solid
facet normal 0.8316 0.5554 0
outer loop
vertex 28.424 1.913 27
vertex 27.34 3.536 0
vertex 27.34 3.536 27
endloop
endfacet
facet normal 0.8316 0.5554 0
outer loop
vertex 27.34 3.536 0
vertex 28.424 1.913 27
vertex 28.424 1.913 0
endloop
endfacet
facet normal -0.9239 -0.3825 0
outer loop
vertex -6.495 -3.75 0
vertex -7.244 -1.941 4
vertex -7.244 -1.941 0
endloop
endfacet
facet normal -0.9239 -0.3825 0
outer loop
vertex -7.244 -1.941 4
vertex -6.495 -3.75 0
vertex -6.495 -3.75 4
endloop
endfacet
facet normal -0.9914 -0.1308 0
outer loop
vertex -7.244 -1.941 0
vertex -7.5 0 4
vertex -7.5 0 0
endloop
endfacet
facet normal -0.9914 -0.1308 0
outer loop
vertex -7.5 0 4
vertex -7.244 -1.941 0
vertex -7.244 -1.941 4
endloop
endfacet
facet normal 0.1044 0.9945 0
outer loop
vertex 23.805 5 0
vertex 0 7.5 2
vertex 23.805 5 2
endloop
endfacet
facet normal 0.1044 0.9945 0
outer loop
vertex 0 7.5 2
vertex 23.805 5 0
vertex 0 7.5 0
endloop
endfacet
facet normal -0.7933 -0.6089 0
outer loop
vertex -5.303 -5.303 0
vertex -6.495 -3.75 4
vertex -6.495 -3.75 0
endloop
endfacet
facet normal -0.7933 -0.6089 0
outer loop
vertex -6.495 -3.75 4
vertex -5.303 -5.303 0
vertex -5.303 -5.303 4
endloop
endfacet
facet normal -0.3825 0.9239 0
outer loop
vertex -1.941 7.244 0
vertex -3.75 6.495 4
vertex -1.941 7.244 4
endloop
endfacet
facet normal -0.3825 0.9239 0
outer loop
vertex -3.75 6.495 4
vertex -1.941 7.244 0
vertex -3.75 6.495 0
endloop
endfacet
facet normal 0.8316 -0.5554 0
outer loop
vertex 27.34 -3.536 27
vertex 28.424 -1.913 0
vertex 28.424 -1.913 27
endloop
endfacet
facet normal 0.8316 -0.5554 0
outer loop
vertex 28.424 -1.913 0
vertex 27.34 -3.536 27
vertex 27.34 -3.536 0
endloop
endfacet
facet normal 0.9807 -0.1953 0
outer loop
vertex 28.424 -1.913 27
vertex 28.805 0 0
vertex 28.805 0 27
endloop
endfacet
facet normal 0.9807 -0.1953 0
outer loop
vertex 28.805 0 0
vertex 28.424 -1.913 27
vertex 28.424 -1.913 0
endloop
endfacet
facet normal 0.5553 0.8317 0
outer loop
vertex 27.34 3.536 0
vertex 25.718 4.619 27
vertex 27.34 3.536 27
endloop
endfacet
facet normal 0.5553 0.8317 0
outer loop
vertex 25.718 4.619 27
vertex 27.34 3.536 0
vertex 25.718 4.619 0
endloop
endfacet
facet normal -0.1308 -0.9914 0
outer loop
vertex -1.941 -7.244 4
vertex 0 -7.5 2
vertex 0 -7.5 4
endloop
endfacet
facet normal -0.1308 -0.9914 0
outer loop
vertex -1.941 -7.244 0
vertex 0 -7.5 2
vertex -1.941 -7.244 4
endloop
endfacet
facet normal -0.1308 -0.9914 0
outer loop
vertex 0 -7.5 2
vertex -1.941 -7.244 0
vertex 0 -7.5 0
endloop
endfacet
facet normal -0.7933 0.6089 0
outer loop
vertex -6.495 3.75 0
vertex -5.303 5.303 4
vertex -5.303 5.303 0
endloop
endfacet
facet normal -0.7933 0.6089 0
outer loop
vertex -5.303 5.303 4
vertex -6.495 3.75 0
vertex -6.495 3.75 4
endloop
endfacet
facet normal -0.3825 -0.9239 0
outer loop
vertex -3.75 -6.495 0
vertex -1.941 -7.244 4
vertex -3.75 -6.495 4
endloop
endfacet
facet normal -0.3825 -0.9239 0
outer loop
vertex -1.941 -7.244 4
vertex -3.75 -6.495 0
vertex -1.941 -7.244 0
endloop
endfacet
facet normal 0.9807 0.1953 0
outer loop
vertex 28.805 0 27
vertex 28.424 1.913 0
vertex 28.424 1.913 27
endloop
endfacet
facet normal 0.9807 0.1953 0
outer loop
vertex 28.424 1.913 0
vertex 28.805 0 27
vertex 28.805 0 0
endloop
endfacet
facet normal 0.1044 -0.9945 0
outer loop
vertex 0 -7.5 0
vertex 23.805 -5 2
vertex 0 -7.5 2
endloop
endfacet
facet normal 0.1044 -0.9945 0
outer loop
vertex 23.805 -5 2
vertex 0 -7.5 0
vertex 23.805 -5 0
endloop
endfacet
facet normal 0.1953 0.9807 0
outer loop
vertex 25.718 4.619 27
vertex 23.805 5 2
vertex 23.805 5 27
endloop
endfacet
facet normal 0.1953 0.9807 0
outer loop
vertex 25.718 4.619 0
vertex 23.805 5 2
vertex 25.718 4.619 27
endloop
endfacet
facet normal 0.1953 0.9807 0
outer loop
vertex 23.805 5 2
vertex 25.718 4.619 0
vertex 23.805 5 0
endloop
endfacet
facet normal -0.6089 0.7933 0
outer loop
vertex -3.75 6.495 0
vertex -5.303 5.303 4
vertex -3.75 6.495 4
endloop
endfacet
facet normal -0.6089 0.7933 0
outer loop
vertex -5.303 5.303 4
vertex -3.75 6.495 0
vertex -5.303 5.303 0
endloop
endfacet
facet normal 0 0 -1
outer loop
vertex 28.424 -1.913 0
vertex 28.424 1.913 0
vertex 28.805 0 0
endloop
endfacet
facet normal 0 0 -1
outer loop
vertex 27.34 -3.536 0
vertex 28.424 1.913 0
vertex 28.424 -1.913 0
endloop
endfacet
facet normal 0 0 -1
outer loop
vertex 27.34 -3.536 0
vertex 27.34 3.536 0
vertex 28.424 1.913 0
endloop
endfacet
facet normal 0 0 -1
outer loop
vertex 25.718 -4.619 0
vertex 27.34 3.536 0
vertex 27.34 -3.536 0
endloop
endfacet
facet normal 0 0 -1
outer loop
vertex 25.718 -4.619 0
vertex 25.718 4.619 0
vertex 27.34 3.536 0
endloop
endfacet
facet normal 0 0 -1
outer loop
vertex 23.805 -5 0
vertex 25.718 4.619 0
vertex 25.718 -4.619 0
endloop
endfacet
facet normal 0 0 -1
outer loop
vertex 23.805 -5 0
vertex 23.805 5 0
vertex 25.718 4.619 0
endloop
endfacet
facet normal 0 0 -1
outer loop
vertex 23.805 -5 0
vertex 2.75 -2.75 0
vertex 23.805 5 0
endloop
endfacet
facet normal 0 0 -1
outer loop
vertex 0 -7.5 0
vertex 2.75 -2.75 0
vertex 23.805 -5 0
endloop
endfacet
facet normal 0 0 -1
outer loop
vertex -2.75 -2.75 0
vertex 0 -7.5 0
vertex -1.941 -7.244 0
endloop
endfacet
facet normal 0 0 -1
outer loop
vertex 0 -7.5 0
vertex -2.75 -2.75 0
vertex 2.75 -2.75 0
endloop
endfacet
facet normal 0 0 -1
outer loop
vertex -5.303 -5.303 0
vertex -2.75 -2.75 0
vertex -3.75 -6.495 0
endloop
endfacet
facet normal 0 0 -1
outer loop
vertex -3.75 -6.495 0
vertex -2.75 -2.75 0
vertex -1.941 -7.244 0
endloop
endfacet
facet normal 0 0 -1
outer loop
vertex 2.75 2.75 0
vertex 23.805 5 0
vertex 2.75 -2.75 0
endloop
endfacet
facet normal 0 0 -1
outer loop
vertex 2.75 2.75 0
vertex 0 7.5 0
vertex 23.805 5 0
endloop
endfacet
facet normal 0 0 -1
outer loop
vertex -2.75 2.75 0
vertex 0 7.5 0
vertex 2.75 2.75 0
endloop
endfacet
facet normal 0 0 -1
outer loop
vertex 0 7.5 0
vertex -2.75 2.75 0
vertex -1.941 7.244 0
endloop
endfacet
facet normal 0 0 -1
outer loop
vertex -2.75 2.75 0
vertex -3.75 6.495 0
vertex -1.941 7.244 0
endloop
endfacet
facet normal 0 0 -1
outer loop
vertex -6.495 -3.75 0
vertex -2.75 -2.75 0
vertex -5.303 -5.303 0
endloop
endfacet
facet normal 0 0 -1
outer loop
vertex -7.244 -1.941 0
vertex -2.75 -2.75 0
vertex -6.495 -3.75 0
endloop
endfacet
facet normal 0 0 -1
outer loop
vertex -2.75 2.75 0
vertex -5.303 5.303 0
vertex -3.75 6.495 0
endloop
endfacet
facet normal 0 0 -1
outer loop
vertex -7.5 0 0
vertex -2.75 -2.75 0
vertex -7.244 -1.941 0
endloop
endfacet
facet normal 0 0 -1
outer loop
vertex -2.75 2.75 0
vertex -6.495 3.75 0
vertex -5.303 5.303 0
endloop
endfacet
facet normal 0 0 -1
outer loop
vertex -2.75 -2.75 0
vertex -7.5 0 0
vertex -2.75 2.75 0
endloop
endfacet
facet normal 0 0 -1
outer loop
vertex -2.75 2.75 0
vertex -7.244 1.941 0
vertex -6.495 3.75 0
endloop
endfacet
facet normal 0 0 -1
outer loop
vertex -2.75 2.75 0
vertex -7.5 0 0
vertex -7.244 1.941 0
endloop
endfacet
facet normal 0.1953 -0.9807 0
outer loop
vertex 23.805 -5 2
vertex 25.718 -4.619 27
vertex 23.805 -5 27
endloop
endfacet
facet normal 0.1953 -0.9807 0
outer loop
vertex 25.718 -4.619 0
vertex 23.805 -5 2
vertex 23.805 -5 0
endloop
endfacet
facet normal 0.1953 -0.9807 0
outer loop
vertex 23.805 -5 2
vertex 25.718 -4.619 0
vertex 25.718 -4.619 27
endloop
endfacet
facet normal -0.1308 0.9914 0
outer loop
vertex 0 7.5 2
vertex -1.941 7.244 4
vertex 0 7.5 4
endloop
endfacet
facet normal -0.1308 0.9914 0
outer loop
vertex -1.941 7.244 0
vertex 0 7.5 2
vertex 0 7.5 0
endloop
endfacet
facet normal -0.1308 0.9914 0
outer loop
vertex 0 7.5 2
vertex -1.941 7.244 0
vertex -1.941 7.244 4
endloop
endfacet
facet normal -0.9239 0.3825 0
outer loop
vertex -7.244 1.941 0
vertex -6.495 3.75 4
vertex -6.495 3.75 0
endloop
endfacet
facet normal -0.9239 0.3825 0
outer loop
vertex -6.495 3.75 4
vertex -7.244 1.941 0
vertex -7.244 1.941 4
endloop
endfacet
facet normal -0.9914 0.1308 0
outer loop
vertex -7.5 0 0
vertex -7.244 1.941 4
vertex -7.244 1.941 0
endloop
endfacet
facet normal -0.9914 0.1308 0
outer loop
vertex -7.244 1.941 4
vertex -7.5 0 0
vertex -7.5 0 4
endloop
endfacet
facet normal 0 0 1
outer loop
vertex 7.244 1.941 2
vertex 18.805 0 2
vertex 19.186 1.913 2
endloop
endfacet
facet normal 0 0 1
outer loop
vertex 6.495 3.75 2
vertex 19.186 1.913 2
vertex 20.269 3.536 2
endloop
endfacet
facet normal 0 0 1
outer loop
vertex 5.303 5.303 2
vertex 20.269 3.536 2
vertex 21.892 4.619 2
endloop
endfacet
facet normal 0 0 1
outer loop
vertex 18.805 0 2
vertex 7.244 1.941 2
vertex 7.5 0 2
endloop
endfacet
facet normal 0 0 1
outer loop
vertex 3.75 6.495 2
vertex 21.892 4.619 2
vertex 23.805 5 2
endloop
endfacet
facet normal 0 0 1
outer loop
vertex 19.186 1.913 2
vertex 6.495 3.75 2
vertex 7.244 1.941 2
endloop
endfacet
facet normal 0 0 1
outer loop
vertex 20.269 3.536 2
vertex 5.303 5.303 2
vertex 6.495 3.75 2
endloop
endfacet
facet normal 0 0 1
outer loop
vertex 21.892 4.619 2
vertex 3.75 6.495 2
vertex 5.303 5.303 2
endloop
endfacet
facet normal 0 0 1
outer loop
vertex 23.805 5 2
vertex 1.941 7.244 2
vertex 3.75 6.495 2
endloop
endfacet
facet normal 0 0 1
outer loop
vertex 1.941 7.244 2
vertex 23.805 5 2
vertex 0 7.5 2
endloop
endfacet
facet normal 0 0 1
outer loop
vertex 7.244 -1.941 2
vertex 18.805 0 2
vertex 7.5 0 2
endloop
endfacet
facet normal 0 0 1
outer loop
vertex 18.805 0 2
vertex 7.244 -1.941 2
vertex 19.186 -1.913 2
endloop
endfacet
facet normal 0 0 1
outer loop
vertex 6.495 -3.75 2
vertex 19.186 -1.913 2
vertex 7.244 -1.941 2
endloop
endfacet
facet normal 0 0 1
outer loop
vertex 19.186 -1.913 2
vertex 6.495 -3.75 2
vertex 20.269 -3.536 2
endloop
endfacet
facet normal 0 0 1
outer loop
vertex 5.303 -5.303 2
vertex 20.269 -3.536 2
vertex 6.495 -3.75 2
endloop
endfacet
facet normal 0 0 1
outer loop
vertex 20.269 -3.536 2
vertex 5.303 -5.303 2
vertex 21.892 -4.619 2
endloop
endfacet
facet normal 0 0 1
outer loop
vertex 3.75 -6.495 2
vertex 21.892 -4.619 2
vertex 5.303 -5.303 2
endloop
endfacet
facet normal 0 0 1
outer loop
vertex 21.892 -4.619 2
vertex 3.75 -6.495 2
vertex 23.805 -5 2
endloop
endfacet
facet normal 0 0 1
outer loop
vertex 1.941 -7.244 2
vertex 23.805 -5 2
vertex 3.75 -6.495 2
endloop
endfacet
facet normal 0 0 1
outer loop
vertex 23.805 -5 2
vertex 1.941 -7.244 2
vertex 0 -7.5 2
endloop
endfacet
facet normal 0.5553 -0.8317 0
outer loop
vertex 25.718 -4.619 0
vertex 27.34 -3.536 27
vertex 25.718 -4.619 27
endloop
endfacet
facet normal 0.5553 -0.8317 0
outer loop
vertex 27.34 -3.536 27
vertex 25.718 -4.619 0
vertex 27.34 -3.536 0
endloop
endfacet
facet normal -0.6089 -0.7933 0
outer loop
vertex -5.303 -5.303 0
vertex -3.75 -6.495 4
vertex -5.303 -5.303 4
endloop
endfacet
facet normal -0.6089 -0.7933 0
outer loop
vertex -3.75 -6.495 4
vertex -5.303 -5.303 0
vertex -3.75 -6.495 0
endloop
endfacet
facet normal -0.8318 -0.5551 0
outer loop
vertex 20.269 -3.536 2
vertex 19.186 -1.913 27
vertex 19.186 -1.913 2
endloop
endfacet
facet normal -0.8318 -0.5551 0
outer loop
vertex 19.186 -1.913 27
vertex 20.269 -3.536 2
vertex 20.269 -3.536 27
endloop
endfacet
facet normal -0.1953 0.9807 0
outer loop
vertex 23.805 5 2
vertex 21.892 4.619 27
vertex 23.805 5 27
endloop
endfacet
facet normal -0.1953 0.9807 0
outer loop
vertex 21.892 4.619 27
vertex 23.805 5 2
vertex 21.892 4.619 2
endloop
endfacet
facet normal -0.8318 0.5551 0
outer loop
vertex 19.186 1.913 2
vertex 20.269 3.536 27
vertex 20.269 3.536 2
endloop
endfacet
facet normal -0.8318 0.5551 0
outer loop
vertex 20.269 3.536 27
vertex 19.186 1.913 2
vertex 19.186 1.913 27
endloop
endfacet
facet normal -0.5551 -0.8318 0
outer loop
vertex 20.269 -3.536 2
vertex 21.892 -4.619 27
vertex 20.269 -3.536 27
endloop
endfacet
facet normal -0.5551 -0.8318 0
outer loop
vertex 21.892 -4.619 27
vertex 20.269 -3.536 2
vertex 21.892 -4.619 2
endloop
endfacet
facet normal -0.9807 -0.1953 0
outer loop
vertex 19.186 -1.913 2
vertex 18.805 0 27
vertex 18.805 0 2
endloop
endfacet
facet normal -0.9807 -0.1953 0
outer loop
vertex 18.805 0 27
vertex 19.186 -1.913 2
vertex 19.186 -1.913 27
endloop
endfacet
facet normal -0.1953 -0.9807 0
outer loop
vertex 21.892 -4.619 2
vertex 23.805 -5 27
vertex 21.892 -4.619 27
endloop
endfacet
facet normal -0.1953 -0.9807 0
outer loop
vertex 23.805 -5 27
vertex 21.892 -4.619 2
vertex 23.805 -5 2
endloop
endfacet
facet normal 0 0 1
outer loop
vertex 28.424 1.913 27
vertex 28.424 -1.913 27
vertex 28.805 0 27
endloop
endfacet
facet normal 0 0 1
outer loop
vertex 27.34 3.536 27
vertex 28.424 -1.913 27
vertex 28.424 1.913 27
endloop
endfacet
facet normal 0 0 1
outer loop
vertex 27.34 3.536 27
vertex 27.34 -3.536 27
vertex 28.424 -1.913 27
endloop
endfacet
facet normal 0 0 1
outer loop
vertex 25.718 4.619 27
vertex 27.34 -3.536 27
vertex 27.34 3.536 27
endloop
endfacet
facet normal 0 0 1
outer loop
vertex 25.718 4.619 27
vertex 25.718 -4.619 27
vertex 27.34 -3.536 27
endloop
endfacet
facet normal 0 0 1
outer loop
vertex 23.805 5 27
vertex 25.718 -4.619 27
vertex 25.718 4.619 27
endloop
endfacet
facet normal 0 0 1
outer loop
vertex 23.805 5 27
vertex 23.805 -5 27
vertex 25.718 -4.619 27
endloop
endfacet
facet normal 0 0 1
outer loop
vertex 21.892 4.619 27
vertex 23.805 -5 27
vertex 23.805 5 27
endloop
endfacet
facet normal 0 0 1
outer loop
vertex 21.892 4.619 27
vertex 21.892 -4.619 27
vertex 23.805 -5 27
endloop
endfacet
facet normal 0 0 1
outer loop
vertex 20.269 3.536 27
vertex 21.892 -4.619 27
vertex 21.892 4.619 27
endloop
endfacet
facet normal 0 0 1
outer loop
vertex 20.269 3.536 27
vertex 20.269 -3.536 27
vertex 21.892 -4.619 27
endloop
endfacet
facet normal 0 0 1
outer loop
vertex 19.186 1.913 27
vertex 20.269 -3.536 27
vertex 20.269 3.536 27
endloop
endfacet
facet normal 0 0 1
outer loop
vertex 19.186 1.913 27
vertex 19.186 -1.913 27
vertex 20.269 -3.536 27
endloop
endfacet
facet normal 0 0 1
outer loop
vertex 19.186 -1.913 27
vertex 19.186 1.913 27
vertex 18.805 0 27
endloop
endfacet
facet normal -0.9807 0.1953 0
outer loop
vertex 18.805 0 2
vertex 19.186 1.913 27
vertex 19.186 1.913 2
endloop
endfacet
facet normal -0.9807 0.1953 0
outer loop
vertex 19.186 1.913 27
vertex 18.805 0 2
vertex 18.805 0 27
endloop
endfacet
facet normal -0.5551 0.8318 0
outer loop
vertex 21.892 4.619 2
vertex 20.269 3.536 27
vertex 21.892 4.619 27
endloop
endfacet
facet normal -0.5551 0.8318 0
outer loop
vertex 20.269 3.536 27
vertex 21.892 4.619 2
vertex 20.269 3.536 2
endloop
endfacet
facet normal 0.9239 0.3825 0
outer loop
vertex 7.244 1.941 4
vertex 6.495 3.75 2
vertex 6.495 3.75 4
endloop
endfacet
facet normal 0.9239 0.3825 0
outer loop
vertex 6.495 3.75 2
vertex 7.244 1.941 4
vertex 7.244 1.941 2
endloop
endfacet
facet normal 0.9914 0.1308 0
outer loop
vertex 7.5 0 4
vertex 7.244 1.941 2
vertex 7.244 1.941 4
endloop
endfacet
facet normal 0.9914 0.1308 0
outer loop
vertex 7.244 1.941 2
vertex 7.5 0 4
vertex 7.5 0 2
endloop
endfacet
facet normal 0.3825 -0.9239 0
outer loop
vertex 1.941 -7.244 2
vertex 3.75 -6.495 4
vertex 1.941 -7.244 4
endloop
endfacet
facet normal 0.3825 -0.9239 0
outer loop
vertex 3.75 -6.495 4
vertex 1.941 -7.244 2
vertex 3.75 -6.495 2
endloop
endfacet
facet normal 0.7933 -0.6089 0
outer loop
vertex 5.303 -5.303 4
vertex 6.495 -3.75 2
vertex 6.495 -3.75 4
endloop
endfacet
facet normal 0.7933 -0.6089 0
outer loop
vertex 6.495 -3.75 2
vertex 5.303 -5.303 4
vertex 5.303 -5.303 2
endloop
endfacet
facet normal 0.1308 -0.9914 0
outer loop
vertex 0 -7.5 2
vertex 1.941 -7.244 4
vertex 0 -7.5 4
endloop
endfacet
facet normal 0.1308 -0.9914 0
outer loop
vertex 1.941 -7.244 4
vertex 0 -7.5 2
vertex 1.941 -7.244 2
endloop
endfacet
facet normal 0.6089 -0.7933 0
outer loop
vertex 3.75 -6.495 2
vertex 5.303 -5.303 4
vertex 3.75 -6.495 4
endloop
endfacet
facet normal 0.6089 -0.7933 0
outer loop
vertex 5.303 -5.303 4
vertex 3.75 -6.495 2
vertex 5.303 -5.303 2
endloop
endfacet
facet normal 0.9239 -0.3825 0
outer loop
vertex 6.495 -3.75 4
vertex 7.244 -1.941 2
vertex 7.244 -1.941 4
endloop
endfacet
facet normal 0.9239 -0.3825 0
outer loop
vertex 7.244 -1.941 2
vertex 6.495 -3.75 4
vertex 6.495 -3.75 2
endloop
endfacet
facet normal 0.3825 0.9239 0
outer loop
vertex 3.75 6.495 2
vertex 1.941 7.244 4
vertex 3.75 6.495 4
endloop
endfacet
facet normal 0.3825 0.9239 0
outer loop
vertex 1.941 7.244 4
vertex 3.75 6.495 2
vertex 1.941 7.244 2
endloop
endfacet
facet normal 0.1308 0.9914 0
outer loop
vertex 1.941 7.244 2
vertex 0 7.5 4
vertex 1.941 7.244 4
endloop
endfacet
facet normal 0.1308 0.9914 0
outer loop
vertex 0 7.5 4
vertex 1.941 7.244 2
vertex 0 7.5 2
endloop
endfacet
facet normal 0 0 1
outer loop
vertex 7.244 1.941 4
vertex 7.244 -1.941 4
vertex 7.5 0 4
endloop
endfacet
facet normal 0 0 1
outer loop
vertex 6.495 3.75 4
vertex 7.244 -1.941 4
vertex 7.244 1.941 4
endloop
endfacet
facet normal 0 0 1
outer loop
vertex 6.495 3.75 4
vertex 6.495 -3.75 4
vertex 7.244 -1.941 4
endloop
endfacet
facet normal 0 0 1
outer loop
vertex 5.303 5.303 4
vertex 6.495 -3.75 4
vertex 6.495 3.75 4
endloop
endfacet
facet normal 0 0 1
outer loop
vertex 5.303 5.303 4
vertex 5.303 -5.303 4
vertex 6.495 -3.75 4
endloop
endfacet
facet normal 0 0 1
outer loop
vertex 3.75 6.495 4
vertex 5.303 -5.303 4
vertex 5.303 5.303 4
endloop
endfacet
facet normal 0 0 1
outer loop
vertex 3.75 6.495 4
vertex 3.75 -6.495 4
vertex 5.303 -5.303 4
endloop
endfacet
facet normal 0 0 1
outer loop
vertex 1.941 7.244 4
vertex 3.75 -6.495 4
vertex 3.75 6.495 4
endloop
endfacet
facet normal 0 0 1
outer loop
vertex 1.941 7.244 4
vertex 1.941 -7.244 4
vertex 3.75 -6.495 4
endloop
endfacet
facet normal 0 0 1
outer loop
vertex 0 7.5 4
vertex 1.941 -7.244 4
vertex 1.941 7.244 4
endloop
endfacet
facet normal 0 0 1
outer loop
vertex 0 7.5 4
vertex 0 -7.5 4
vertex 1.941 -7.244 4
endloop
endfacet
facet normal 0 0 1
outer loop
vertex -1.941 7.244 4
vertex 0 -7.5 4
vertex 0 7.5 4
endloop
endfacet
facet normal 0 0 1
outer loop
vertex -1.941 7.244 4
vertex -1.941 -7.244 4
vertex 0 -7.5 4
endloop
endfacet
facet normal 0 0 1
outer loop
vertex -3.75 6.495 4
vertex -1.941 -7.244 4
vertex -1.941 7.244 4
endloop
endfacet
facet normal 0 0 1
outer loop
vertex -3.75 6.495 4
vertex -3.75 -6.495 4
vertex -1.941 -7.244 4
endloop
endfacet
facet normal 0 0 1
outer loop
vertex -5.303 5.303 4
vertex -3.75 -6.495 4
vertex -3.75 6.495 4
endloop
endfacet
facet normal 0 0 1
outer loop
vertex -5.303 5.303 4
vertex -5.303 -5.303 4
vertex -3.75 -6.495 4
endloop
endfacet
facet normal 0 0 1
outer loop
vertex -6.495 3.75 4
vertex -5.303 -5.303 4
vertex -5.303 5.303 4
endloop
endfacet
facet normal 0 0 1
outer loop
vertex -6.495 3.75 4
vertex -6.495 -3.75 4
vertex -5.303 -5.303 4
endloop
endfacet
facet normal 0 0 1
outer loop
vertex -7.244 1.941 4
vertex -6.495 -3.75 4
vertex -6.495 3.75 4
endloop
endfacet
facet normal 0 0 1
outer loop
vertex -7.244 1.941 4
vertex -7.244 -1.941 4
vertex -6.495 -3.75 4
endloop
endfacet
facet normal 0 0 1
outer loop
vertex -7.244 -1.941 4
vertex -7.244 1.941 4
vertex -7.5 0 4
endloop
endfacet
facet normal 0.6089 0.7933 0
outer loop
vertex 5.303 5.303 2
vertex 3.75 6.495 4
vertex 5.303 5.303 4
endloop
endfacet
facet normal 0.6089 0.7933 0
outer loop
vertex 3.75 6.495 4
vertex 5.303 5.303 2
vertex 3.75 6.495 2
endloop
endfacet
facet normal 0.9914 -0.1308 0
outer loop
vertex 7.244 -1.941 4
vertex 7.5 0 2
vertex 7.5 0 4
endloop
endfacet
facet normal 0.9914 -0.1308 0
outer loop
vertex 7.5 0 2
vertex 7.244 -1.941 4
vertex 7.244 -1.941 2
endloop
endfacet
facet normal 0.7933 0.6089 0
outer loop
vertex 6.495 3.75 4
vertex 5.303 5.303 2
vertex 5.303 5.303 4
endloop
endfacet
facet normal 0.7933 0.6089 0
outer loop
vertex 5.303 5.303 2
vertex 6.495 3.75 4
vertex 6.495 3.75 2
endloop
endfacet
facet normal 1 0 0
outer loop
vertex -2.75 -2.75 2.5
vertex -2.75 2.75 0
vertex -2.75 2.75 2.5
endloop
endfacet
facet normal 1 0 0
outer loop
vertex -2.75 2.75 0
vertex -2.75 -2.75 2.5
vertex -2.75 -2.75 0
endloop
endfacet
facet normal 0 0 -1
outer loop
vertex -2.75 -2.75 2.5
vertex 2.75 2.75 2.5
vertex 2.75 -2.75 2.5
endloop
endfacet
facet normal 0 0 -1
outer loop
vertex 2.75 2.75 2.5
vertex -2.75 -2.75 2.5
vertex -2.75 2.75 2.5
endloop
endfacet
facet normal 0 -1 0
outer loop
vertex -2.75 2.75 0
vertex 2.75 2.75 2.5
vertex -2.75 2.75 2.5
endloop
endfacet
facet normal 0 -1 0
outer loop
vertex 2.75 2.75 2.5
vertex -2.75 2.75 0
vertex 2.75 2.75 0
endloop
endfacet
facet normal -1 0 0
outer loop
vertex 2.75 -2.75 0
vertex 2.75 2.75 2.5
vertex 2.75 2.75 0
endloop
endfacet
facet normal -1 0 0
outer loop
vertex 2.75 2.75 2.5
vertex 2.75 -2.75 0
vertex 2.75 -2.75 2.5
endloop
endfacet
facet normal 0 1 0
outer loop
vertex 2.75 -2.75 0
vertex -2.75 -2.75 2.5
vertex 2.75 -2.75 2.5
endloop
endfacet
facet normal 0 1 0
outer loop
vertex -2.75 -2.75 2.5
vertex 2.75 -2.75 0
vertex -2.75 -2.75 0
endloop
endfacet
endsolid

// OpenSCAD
// file: varicap.scad
capacitance = 400; // pF
num_plates = 11;
plate_gap = 5;
plate_thickness = 2;

strut_r = 5;
handle_length = 25;
leg_length = 10;
leg_separation_angle=90;

fit_gap = 0.5;
slip_gap = 1;

num_stators = floor(num_plates/2);
num_rotors = ceil(num_plates/2);
leg_angle_0 = leg_separation_angle/2;
leg_angle_1 = 360 - leg_separation_angle/2;
r = sqrt((2*plate_gap*capacitance) / ((num_plates-1)*0.2248*3.14));
//TODO: account for space missing in the centre of the plates

module semicircle () {
    difference() {
        circle(r);
        circle(strut_r-fit_gap);
        translate([r,0,0]) {
            square(2*r, true);
        }
    }
}

module washer() {
    difference() {
        circle(strut_r);
        circle(bolt_r);
    }
}

module spacer(end) {
    
    washer_len = plate_thickness + plate_gap - slip_gap/2;
    bearing_len = end ? plate_thickness*2 + plate_gap + slip_gap/2 : plate_thickness+plate_gap;
    
    difference () {
        union () {
            if (end) {
                linear_extrude (washer_len) {
                    circle (strut_r * 1.5);
                }
            }
            linear_extrude (bearing_len) {
                circle (strut_r);
            }
            translate ([0,0,bearing_len - fit_gap]) {
                linear_extrude(plate_thickness+fit_gap) {
                    square (strut_r, true);
                }
            }
        }
        
        translate ([0,0,-fit_gap]) {
            linear_extrude (plate_thickness + fit_gap*2) {
                square (strut_r+fit_gap, true);
            }
        }
    }
}
// main file
include <varicap.scad>;

module handle () {
    difference () {
        union () {
            linear_extrude (plate_thickness) {
                hull () {
                    circle (strut_r * 1.5);
                    translate ([r,0,0]) {
                        circle (strut_r);
                    }
                }
            }
            
            linear_extrude (plate_thickness+handle_length) {
                translate ([r,0,0]) {
                    circle (strut_r);
                }
            }
            
            linear_extrude (plate_thickness*2) {
                circle (strut_r * 1.5);
            }
        }
        translate ([0,0,-fit_gap]) {
            linear_extrude (plate_thickness + 2*fit_gap) {
                square (strut_r+fit_gap, true);
            }
        }
    }
}

handle ();
